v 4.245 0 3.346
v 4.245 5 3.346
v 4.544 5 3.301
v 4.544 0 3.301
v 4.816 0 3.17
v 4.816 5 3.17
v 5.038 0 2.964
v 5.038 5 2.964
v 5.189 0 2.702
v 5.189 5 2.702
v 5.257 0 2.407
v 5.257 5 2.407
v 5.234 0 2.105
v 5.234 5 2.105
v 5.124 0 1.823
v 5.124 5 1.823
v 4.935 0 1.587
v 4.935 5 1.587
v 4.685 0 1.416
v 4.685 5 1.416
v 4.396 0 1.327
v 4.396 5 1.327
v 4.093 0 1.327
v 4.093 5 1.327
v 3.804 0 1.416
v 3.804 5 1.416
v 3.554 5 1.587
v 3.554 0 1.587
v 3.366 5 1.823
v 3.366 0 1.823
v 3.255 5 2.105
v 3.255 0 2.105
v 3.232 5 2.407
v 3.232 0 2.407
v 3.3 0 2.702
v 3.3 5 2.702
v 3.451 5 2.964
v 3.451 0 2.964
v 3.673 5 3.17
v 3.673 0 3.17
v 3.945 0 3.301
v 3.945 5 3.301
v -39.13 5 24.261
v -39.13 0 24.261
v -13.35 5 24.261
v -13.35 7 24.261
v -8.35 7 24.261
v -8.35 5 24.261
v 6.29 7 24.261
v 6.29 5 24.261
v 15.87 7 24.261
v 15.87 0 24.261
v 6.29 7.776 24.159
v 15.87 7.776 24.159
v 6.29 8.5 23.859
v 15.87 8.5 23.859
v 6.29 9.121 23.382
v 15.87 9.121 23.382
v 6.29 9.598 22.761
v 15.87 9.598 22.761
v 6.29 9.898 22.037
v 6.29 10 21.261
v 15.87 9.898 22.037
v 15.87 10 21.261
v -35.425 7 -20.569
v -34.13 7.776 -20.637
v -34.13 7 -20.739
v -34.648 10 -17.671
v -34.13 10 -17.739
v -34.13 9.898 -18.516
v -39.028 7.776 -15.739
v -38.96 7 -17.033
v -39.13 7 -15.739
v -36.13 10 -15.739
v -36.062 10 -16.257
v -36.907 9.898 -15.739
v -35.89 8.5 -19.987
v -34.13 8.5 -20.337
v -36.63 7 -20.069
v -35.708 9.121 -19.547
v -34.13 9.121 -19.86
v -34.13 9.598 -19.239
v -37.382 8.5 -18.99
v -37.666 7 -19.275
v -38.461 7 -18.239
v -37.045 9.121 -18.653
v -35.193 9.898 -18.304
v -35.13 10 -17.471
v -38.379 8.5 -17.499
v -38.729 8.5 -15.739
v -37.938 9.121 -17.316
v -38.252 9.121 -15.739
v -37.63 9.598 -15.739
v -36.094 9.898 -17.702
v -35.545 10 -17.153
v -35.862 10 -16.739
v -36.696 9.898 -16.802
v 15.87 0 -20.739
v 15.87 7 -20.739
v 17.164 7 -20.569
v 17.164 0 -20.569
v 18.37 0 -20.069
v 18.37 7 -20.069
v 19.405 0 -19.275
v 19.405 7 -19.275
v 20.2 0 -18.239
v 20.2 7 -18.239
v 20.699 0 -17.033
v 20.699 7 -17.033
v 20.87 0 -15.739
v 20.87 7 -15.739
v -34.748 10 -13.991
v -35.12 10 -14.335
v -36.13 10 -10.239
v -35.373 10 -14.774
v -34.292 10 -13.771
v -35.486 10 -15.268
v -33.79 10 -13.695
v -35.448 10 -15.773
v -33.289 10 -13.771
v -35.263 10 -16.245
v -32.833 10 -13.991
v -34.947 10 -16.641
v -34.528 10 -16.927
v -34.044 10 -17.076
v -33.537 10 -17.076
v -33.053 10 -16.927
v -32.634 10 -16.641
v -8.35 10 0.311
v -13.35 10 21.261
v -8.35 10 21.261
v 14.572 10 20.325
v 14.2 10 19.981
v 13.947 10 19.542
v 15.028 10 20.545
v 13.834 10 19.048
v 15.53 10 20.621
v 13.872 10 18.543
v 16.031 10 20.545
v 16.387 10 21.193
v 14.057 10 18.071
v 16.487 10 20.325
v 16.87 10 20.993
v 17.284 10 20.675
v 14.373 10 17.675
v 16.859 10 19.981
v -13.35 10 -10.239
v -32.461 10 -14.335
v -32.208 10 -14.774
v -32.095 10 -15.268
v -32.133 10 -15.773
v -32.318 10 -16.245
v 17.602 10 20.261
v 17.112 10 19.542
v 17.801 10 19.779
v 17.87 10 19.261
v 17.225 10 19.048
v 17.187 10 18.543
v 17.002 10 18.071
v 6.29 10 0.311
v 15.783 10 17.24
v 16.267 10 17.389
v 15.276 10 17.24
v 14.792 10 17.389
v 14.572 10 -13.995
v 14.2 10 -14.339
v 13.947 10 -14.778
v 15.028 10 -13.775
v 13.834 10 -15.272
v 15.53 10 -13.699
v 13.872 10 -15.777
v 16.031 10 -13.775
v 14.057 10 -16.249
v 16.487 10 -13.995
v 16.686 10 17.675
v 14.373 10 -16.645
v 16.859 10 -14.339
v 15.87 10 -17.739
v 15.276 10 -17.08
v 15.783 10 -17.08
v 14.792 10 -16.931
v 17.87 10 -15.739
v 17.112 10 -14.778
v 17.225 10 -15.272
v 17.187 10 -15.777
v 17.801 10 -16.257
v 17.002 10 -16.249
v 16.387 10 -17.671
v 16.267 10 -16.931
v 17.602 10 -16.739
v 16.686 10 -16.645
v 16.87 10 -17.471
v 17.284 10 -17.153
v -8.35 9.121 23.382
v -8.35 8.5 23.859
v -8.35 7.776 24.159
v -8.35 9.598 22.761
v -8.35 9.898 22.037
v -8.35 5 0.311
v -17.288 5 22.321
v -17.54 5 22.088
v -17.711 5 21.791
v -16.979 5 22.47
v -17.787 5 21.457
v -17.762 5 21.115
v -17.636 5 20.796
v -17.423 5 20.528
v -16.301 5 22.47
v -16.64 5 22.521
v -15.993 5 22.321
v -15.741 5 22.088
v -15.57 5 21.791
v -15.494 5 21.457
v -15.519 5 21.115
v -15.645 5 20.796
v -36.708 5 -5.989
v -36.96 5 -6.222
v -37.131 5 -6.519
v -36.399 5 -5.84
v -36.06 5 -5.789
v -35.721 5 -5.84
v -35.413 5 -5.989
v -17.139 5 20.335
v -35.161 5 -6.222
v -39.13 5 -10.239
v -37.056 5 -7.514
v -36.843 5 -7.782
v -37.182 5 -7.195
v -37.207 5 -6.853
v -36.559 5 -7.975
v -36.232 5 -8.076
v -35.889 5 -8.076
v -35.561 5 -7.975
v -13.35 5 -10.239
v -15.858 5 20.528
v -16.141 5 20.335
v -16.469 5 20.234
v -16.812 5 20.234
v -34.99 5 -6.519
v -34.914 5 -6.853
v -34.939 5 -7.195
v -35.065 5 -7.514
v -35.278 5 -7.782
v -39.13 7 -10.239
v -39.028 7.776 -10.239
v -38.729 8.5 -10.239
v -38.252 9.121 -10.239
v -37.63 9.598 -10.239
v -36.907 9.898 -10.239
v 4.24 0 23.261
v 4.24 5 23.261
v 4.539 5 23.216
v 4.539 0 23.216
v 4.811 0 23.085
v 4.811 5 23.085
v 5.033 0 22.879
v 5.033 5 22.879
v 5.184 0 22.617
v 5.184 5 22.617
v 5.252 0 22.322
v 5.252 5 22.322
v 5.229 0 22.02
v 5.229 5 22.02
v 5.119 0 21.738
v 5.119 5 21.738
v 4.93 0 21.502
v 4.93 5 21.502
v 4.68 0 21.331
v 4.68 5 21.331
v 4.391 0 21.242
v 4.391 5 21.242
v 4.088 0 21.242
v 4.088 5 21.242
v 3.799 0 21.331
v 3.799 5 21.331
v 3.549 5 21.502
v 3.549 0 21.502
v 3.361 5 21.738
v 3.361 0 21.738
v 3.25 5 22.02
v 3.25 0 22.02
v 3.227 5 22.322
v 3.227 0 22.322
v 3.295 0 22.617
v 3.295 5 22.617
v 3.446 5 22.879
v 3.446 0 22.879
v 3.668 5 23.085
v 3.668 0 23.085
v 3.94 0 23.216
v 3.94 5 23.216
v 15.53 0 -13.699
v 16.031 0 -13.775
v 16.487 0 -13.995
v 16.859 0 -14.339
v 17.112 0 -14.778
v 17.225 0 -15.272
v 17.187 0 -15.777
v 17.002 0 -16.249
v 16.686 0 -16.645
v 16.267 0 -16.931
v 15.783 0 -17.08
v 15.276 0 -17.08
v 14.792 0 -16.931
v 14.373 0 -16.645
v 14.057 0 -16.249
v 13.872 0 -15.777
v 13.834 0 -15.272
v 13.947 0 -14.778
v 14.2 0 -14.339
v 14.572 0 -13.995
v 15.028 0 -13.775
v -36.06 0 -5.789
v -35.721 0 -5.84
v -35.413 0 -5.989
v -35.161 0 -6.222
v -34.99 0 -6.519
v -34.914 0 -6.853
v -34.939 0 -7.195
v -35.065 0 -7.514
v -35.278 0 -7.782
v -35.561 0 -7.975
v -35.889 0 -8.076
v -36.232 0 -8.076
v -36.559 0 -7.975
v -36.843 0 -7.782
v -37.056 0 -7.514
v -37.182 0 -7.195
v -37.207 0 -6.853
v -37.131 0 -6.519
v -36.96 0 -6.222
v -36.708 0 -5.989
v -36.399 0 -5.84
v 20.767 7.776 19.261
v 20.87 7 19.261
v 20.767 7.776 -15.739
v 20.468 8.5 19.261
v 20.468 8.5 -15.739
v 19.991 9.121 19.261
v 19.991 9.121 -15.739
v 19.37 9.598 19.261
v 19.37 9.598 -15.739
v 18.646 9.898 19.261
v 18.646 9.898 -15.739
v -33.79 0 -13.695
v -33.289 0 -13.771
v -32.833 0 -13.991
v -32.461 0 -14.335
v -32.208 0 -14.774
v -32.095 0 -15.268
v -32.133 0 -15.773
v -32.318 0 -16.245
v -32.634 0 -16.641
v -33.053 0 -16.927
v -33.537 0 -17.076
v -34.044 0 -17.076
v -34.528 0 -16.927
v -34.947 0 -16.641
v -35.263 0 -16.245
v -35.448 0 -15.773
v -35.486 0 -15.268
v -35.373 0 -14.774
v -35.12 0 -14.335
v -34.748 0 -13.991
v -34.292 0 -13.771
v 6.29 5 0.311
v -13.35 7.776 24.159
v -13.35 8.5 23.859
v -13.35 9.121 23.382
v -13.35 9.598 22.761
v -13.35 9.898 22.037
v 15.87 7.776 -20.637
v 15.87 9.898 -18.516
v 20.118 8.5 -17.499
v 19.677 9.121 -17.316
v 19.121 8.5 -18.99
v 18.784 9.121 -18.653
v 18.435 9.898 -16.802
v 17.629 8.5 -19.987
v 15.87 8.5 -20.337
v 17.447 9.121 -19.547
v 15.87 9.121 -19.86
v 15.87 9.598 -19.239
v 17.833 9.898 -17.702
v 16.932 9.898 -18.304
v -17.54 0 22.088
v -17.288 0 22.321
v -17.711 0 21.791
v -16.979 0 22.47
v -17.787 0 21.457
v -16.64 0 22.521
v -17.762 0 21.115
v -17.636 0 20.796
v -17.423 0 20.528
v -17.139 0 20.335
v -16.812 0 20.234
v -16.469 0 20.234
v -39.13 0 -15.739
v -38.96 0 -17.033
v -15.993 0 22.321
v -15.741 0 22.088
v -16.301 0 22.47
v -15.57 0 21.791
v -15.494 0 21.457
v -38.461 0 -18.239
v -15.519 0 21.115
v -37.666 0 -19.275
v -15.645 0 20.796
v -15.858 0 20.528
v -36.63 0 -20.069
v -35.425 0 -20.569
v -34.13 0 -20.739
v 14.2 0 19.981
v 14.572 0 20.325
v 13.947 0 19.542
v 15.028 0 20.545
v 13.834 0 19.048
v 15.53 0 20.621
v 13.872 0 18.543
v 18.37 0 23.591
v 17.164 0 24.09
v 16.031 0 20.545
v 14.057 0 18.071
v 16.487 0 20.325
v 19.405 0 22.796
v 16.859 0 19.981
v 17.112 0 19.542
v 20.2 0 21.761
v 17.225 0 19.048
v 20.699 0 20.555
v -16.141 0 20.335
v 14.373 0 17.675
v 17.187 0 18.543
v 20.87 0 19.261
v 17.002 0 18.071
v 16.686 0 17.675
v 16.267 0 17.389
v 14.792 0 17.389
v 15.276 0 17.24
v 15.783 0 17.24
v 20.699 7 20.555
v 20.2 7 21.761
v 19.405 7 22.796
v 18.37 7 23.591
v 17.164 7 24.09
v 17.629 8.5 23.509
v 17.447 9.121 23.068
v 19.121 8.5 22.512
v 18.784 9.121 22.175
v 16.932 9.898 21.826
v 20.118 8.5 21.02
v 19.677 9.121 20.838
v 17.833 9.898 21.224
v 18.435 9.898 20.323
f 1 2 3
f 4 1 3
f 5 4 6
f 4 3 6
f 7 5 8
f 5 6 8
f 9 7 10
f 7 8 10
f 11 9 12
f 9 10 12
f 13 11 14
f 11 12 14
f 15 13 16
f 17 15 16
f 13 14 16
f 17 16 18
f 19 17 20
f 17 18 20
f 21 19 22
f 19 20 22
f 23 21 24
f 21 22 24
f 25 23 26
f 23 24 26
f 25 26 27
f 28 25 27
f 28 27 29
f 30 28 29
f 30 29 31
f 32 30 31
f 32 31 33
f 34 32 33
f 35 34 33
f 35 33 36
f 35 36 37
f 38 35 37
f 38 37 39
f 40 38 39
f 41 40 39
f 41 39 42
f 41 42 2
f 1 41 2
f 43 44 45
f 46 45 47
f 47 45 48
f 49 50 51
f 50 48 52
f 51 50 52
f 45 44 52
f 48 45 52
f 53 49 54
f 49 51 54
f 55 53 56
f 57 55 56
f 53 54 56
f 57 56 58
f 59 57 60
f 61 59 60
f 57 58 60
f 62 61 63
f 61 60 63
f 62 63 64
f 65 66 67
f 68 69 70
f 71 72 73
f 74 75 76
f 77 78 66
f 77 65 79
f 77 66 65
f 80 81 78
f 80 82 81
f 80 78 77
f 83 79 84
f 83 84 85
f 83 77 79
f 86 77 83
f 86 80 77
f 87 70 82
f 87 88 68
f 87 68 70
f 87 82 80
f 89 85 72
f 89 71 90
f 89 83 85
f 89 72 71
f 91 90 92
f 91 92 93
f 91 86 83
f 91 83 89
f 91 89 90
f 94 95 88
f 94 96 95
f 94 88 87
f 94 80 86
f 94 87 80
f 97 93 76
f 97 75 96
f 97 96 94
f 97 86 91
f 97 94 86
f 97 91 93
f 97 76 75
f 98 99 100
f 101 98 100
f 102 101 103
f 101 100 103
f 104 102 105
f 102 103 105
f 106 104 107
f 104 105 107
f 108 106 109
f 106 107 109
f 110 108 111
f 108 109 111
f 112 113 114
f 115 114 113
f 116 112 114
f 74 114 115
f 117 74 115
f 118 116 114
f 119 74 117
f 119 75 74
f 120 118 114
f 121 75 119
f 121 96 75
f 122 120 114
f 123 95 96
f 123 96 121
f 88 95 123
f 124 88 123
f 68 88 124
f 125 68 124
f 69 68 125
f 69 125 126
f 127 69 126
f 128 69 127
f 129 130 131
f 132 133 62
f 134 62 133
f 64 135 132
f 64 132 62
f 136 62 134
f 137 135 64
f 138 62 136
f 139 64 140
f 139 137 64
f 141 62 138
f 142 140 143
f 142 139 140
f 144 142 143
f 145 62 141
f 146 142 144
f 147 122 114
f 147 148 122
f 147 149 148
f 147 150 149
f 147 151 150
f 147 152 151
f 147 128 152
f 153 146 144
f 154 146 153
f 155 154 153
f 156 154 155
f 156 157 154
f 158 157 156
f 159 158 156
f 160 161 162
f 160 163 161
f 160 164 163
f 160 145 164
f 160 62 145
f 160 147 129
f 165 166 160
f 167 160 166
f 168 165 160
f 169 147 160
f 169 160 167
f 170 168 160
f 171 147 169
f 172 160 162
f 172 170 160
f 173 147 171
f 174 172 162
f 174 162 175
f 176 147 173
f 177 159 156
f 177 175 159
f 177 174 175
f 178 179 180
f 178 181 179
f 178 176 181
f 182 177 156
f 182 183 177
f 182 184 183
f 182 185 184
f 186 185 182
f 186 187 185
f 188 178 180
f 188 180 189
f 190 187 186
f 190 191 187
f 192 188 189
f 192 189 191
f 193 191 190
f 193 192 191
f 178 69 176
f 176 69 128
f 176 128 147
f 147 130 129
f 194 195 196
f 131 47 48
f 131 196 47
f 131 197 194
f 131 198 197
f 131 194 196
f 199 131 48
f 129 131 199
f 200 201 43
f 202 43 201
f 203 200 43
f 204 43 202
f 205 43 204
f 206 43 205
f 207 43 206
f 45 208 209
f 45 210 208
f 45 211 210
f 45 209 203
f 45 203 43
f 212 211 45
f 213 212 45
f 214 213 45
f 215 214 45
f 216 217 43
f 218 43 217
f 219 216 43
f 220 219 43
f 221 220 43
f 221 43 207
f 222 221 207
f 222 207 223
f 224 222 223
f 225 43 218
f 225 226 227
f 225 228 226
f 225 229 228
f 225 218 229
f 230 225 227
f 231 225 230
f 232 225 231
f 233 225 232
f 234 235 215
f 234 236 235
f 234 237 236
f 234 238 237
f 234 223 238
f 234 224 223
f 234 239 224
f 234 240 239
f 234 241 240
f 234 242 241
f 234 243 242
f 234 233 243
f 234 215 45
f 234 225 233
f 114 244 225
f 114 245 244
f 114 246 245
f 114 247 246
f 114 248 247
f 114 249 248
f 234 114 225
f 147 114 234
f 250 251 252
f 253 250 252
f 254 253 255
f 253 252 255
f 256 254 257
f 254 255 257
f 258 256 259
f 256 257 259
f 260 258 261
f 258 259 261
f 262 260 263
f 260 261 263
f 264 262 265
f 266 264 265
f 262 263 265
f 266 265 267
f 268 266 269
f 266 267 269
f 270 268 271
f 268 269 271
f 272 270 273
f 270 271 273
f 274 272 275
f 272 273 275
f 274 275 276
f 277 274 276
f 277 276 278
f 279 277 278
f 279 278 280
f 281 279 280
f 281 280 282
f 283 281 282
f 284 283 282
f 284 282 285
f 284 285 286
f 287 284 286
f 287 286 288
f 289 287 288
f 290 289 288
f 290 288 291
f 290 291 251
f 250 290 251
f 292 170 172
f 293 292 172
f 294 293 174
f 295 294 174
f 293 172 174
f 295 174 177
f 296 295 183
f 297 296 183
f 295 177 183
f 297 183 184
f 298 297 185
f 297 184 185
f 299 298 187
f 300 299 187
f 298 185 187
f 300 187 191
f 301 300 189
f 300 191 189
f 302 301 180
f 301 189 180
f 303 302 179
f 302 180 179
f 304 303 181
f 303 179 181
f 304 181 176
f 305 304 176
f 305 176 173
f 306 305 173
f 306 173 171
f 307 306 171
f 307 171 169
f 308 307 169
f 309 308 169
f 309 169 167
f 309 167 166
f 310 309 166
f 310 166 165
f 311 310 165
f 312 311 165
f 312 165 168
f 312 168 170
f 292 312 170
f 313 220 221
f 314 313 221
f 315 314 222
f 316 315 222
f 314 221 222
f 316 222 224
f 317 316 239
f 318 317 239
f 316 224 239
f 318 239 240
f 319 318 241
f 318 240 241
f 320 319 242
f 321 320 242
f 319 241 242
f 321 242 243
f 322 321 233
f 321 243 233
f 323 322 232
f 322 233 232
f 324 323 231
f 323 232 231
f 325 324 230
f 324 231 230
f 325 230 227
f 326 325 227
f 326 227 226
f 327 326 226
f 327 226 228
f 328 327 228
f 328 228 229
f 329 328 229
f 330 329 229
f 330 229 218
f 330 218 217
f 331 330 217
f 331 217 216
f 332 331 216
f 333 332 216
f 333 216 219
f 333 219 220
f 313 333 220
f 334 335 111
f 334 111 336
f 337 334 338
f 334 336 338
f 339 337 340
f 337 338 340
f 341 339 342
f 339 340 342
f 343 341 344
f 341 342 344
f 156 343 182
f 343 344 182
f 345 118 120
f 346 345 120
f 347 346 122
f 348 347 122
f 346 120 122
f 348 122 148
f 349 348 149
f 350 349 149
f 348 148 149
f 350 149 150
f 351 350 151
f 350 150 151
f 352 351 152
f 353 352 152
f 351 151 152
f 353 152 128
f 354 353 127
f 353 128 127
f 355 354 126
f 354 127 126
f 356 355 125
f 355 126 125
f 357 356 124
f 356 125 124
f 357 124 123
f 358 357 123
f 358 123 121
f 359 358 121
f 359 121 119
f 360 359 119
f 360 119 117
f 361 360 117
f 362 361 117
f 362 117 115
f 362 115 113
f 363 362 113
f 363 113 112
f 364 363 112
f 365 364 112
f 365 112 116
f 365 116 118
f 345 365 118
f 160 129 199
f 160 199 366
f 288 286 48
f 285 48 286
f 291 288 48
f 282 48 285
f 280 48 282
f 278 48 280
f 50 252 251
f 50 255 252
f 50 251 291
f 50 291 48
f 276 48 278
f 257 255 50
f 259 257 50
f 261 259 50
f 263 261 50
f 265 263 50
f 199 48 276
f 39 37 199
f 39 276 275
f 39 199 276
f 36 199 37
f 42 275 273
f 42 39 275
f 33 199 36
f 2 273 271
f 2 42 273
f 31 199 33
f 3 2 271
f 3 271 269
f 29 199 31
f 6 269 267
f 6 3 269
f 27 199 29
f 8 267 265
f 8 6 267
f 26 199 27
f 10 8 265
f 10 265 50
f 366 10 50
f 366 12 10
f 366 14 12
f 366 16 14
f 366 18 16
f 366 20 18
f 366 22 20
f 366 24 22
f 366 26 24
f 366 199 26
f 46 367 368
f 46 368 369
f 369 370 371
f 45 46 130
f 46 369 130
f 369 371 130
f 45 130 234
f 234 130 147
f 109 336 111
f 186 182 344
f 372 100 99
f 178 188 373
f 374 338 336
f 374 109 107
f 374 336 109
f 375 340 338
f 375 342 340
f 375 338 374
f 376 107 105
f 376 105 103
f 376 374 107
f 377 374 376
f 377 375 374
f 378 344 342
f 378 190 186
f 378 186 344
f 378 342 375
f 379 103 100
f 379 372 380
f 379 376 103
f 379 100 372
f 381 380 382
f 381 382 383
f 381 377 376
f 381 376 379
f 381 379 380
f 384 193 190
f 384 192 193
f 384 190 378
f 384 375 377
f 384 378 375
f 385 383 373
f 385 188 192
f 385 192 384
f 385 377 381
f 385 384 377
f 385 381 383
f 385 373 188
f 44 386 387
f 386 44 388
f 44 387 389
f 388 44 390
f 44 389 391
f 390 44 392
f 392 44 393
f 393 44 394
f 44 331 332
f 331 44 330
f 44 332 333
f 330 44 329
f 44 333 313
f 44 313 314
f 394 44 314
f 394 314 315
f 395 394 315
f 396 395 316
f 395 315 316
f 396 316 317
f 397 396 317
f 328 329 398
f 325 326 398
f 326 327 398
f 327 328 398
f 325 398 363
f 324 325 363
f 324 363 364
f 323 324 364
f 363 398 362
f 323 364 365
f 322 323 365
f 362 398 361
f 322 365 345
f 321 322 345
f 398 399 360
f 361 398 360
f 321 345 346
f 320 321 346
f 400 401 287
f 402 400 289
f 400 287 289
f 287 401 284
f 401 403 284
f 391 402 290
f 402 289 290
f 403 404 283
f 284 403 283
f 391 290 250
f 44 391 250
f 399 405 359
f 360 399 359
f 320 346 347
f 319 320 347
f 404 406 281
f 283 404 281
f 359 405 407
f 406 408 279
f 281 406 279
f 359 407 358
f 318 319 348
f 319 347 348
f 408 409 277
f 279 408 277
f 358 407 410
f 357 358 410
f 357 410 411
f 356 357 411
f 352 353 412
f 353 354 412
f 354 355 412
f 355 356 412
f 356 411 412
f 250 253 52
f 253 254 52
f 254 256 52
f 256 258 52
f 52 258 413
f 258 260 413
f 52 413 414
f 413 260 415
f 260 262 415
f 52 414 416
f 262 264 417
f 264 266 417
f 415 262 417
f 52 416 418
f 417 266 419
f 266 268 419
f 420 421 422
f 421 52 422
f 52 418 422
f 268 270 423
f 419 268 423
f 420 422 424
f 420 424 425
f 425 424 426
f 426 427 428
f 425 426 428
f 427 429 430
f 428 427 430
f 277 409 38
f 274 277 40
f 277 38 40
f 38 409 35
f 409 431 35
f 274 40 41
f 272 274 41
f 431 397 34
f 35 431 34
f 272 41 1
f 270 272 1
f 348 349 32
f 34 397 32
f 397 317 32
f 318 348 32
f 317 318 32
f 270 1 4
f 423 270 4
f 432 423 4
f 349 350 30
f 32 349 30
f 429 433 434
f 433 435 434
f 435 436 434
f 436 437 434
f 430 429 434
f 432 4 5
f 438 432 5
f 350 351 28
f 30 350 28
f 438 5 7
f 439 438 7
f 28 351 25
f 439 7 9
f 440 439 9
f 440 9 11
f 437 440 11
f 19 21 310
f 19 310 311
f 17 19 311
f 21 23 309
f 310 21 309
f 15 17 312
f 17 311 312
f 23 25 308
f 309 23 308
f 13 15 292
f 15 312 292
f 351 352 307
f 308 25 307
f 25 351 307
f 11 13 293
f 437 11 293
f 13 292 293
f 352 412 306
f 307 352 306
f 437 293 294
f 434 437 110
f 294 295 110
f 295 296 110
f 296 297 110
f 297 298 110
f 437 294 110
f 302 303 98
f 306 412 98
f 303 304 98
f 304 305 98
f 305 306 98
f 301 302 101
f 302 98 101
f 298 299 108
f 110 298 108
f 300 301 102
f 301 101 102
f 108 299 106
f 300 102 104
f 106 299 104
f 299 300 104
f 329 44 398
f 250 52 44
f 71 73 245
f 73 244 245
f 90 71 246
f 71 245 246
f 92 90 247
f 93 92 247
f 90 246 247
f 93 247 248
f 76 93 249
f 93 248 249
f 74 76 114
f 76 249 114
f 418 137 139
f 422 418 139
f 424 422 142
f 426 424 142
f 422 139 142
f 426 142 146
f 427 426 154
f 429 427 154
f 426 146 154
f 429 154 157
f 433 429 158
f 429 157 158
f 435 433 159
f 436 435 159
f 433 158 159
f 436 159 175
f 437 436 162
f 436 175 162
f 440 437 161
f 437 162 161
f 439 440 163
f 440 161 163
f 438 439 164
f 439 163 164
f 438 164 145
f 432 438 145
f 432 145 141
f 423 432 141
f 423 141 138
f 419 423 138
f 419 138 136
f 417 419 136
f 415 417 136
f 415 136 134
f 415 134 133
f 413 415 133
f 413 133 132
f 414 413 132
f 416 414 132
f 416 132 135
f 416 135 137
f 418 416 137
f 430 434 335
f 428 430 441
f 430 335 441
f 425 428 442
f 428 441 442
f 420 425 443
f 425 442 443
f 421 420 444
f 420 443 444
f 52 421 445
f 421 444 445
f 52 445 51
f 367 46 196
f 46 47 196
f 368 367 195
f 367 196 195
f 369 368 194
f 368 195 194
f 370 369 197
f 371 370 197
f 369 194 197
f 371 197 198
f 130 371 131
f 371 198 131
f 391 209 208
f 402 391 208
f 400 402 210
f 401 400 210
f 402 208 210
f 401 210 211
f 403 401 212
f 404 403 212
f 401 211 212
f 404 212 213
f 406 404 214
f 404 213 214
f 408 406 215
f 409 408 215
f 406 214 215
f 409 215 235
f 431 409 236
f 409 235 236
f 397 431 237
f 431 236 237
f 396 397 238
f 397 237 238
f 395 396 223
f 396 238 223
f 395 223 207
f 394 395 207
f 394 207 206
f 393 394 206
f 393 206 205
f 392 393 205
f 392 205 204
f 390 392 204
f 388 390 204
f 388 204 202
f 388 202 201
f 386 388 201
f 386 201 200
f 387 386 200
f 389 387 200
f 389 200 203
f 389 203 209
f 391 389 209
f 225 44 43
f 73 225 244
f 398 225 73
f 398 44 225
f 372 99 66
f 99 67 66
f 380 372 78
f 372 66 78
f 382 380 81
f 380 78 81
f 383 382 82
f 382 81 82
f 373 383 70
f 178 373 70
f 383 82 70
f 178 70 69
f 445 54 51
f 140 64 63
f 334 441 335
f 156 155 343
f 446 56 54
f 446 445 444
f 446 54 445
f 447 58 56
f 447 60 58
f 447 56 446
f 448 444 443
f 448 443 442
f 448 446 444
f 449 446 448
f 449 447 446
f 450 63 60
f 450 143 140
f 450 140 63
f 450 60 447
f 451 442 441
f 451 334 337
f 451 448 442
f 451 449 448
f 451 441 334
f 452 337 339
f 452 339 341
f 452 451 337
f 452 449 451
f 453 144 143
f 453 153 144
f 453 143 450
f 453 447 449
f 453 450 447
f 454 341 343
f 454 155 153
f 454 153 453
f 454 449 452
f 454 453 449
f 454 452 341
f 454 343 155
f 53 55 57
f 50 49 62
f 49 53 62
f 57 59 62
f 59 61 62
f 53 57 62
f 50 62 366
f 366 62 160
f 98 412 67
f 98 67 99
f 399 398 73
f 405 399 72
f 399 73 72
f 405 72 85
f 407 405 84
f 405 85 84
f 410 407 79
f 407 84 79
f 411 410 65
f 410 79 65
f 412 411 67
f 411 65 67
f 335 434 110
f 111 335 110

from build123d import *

# Parameters (mm, degrees)
SKETCH1_W           = 60
SKETCH1_H           = 45
BOSS_EXTRUDE1_DEPTH = 10
SKETCH2_W           = 25.78
SKETCH2_H           = 34.5
CUT_EXTRUDE1_DEPTH  = 5
CUT_EXTRUDE2_REACH  = 48.312
SKETCH3_R           = 1.15
SKETCH4_W           = 14.64
SKETCH4_H           = 23.95
CUT_EXTRUDE3_DEPTH  = 5
CUT_EXTRUDE4_REACH  = 48.312
SKETCH5_R           = 1.015
FILLET1_R           = 5
FILLET2_R           = 5
FILLET3_R           = 5
FILLET4_R           = 3
CUT_EXTRUDE5_REACH  = 49.115
SKETCH6_R           = 1.7


with BuildPart() as part:
    # Sketch1 → Boss-Extrude1 (new body)
    with BuildSketch(Plane(origin=(0, 0, 0), x_dir=(1, 0, 0), z_dir=(0, 1, 0))):
        with Locations((-9.130434783, -1.760869565)):
            Rectangle(SKETCH1_W, SKETCH1_H)
    extrude(amount=BOSS_EXTRUDE1_DEPTH)

    # Sketch2 → Cut-Extrude1 (cut)
    with BuildSketch(Plane(origin=(0, 10, 0), x_dir=(1, 0, 0), z_dir=(0, 1, 0))):
        with Locations((-26.240434783, -7.010869565)):
            Rectangle(SKETCH2_W, SKETCH2_H)
    extrude(amount=-CUT_EXTRUDE1_DEPTH, mode=Mode.SUBTRACT)

    # Sketch3 → Cut-Extrude2 (cut, up to next)
    with BuildSketch(Plane(origin=(0, 5, 0), x_dir=(1, 0, 0), z_dir=(0, 1, 0)), mode=Mode.PRIVATE) as cut_extrude2_sk1:
        with Locations(Location((-36.060434783, 6.939130435, 0), (0, 0, 270))):
            Circle(SKETCH3_R)
    cut_extrude2_tool1 = extrude(cut_extrude2_sk1.sketch, amount=-CUT_EXTRUDE2_REACH, mode=Mode.PRIVATE) & part.part
    # Sketch3 → Cut-Extrude2 (cut, up to next)
    with BuildSketch(Plane(origin=(0, 5, 0), x_dir=(1, 0, 0), z_dir=(0, 1, 0)), mode=Mode.PRIVATE) as cut_extrude2_sk2:
        with Locations(Location((-16.640434783, -21.370869565, 0), (0, 0, 270))):
            Circle(SKETCH3_R)
    cut_extrude2_tool2 = extrude(cut_extrude2_sk2.sketch, amount=-CUT_EXTRUDE2_REACH, mode=Mode.PRIVATE) & part.part
    add(cut_extrude2_tool1.solids().sort_by_distance((-36.060435, 5, -6.93913))[0], mode=Mode.SUBTRACT)
    add(cut_extrude2_tool2.solids().sort_by_distance((-16.640435, 5, 21.37087))[0], mode=Mode.SUBTRACT)

    # Sketch4 → Cut-Extrude3 (cut)
    with BuildSketch(Plane(origin=(0, 10, 0), x_dir=(1, 0, 0), z_dir=(0, 1, 0))):
        with Locations((-1.030434783, -12.285869565)):
            Rectangle(SKETCH4_W, SKETCH4_H)
    extrude(amount=-CUT_EXTRUDE3_DEPTH, mode=Mode.SUBTRACT)

    # Sketch5 → Cut-Extrude4 (cut, up to next)
    with BuildSketch(Plane(origin=(0, 5, 0), x_dir=(1, 0, 0), z_dir=(0, 1, 0)), mode=Mode.PRIVATE) as cut_extrude4_sk1:
        with Locations(Location((4.244565217, -2.330869565, 0), (0, 0, 270))):
            Circle(SKETCH5_R)
    cut_extrude4_tool1 = extrude(cut_extrude4_sk1.sketch, amount=-CUT_EXTRUDE4_REACH, mode=Mode.PRIVATE) & part.part
    # Sketch5 → Cut-Extrude4 (cut, up to next)
    with BuildSketch(Plane(origin=(0, 5, 0), x_dir=(1, 0, 0), z_dir=(0, 1, 0)), mode=Mode.PRIVATE) as cut_extrude4_sk2:
        with Locations(Location((4.239565217, -22.245869565, 0), (0, 0, 270))):
            Circle(SKETCH5_R)
    cut_extrude4_tool2 = extrude(cut_extrude4_sk2.sketch, amount=-CUT_EXTRUDE4_REACH, mode=Mode.PRIVATE) & part.part
    add(cut_extrude4_tool1.solids().sort_by_distance((4.244565, 5, 2.33087))[0], mode=Mode.SUBTRACT)
    add(cut_extrude4_tool2.solids().sort_by_distance((4.239565, 5, 22.24587))[0], mode=Mode.SUBTRACT)

    # Fillet1
    fillet1_edges = [part.edges().sort_by_distance(p)[0] for p in [
        (-39.130434783, 5, -20.739130435),
    ]]
    fillet(fillet1_edges, radius=FILLET1_R)

    # Fillet2
    fillet2_edges = [part.edges().sort_by_distance(p)[0] for p in [
        (20.869565217, 5, -20.739130435),
    ]]
    fillet(fillet2_edges, radius=FILLET2_R)

    # Fillet3
    fillet3_edges = [part.edges().sort_by_distance(p)[0] for p in [
        (20.869565217, 5, 24.260869565),
    ]]
    fillet(fillet3_edges, radius=FILLET3_R)

    # Fillet4
    fillet4_edges = [part.edges().sort_by_distance(p)[0] for p in [
        (-10.850434783, 10, 24.260869565),
        (11.079565217, 10, 24.260869565),
        (-39.130434783, 10, -12.989130435),
        (-37.665968689, 10, -19.274664341),
        (-9.130434783, 10, -20.739130435),
        (19.405099123, 10, -19.274664341),
        (20.869565217, 10, 1.760869565),
        (19.405099123, 10, 22.796403471),
    ]]
    fillet(fillet4_edges, radius=FILLET4_R)

    # Sketch6 → Cut-Extrude5 (cut, up to next)
    with BuildSketch(Plane(origin=(0, 10, 0), x_dir=(1, 0, 0), z_dir=(0, 1, 0)), mode=Mode.PRIVATE) as cut_extrude5_sk1:
        with Locations(Location((-33.790434783, 15.395190435, 0), (0, 0, 270))):
            Circle(SKETCH6_R)
    cut_extrude5_tool1 = extrude(cut_extrude5_sk1.sketch, amount=-CUT_EXTRUDE5_REACH, mode=Mode.PRIVATE) & part.part
    # Sketch6 → Cut-Extrude5 (cut, up to next)
    with BuildSketch(Plane(origin=(0, 10, 0), x_dir=(1, 0, 0), z_dir=(0, 1, 0)), mode=Mode.PRIVATE) as cut_extrude5_sk2:
        with Locations(Location((15.529565217, 15.399130435, 0), (0, 0, 270))):
            Circle(SKETCH6_R)
    cut_extrude5_tool2 = extrude(cut_extrude5_sk2.sketch, amount=-CUT_EXTRUDE5_REACH, mode=Mode.PRIVATE) & part.part
    # Sketch6 → Cut-Extrude5 (cut, up to next)
    with BuildSketch(Plane(origin=(0, 10, 0), x_dir=(1, 0, 0), z_dir=(0, 1, 0)), mode=Mode.PRIVATE) as cut_extrude5_sk3:
        with Locations(Location((15.529565217, -18.920869565, 0), (0, 0, 270))):
            Circle(SKETCH6_R)
    cut_extrude5_tool3 = extrude(cut_extrude5_sk3.sketch, amount=-CUT_EXTRUDE5_REACH, mode=Mode.PRIVATE) & part.part
    add(cut_extrude5_tool1.solids().sort_by_distance((-33.790435, 10, -15.39519))[0], mode=Mode.SUBTRACT)
    add(cut_extrude5_tool2.solids().sort_by_distance((15.529565, 10, -15.39913))[0], mode=Mode.SUBTRACT)
    add(cut_extrude5_tool3.solids().sort_by_distance((15.529565, 10, 18.92087))[0], mode=Mode.SUBTRACT)


solid = part.part
